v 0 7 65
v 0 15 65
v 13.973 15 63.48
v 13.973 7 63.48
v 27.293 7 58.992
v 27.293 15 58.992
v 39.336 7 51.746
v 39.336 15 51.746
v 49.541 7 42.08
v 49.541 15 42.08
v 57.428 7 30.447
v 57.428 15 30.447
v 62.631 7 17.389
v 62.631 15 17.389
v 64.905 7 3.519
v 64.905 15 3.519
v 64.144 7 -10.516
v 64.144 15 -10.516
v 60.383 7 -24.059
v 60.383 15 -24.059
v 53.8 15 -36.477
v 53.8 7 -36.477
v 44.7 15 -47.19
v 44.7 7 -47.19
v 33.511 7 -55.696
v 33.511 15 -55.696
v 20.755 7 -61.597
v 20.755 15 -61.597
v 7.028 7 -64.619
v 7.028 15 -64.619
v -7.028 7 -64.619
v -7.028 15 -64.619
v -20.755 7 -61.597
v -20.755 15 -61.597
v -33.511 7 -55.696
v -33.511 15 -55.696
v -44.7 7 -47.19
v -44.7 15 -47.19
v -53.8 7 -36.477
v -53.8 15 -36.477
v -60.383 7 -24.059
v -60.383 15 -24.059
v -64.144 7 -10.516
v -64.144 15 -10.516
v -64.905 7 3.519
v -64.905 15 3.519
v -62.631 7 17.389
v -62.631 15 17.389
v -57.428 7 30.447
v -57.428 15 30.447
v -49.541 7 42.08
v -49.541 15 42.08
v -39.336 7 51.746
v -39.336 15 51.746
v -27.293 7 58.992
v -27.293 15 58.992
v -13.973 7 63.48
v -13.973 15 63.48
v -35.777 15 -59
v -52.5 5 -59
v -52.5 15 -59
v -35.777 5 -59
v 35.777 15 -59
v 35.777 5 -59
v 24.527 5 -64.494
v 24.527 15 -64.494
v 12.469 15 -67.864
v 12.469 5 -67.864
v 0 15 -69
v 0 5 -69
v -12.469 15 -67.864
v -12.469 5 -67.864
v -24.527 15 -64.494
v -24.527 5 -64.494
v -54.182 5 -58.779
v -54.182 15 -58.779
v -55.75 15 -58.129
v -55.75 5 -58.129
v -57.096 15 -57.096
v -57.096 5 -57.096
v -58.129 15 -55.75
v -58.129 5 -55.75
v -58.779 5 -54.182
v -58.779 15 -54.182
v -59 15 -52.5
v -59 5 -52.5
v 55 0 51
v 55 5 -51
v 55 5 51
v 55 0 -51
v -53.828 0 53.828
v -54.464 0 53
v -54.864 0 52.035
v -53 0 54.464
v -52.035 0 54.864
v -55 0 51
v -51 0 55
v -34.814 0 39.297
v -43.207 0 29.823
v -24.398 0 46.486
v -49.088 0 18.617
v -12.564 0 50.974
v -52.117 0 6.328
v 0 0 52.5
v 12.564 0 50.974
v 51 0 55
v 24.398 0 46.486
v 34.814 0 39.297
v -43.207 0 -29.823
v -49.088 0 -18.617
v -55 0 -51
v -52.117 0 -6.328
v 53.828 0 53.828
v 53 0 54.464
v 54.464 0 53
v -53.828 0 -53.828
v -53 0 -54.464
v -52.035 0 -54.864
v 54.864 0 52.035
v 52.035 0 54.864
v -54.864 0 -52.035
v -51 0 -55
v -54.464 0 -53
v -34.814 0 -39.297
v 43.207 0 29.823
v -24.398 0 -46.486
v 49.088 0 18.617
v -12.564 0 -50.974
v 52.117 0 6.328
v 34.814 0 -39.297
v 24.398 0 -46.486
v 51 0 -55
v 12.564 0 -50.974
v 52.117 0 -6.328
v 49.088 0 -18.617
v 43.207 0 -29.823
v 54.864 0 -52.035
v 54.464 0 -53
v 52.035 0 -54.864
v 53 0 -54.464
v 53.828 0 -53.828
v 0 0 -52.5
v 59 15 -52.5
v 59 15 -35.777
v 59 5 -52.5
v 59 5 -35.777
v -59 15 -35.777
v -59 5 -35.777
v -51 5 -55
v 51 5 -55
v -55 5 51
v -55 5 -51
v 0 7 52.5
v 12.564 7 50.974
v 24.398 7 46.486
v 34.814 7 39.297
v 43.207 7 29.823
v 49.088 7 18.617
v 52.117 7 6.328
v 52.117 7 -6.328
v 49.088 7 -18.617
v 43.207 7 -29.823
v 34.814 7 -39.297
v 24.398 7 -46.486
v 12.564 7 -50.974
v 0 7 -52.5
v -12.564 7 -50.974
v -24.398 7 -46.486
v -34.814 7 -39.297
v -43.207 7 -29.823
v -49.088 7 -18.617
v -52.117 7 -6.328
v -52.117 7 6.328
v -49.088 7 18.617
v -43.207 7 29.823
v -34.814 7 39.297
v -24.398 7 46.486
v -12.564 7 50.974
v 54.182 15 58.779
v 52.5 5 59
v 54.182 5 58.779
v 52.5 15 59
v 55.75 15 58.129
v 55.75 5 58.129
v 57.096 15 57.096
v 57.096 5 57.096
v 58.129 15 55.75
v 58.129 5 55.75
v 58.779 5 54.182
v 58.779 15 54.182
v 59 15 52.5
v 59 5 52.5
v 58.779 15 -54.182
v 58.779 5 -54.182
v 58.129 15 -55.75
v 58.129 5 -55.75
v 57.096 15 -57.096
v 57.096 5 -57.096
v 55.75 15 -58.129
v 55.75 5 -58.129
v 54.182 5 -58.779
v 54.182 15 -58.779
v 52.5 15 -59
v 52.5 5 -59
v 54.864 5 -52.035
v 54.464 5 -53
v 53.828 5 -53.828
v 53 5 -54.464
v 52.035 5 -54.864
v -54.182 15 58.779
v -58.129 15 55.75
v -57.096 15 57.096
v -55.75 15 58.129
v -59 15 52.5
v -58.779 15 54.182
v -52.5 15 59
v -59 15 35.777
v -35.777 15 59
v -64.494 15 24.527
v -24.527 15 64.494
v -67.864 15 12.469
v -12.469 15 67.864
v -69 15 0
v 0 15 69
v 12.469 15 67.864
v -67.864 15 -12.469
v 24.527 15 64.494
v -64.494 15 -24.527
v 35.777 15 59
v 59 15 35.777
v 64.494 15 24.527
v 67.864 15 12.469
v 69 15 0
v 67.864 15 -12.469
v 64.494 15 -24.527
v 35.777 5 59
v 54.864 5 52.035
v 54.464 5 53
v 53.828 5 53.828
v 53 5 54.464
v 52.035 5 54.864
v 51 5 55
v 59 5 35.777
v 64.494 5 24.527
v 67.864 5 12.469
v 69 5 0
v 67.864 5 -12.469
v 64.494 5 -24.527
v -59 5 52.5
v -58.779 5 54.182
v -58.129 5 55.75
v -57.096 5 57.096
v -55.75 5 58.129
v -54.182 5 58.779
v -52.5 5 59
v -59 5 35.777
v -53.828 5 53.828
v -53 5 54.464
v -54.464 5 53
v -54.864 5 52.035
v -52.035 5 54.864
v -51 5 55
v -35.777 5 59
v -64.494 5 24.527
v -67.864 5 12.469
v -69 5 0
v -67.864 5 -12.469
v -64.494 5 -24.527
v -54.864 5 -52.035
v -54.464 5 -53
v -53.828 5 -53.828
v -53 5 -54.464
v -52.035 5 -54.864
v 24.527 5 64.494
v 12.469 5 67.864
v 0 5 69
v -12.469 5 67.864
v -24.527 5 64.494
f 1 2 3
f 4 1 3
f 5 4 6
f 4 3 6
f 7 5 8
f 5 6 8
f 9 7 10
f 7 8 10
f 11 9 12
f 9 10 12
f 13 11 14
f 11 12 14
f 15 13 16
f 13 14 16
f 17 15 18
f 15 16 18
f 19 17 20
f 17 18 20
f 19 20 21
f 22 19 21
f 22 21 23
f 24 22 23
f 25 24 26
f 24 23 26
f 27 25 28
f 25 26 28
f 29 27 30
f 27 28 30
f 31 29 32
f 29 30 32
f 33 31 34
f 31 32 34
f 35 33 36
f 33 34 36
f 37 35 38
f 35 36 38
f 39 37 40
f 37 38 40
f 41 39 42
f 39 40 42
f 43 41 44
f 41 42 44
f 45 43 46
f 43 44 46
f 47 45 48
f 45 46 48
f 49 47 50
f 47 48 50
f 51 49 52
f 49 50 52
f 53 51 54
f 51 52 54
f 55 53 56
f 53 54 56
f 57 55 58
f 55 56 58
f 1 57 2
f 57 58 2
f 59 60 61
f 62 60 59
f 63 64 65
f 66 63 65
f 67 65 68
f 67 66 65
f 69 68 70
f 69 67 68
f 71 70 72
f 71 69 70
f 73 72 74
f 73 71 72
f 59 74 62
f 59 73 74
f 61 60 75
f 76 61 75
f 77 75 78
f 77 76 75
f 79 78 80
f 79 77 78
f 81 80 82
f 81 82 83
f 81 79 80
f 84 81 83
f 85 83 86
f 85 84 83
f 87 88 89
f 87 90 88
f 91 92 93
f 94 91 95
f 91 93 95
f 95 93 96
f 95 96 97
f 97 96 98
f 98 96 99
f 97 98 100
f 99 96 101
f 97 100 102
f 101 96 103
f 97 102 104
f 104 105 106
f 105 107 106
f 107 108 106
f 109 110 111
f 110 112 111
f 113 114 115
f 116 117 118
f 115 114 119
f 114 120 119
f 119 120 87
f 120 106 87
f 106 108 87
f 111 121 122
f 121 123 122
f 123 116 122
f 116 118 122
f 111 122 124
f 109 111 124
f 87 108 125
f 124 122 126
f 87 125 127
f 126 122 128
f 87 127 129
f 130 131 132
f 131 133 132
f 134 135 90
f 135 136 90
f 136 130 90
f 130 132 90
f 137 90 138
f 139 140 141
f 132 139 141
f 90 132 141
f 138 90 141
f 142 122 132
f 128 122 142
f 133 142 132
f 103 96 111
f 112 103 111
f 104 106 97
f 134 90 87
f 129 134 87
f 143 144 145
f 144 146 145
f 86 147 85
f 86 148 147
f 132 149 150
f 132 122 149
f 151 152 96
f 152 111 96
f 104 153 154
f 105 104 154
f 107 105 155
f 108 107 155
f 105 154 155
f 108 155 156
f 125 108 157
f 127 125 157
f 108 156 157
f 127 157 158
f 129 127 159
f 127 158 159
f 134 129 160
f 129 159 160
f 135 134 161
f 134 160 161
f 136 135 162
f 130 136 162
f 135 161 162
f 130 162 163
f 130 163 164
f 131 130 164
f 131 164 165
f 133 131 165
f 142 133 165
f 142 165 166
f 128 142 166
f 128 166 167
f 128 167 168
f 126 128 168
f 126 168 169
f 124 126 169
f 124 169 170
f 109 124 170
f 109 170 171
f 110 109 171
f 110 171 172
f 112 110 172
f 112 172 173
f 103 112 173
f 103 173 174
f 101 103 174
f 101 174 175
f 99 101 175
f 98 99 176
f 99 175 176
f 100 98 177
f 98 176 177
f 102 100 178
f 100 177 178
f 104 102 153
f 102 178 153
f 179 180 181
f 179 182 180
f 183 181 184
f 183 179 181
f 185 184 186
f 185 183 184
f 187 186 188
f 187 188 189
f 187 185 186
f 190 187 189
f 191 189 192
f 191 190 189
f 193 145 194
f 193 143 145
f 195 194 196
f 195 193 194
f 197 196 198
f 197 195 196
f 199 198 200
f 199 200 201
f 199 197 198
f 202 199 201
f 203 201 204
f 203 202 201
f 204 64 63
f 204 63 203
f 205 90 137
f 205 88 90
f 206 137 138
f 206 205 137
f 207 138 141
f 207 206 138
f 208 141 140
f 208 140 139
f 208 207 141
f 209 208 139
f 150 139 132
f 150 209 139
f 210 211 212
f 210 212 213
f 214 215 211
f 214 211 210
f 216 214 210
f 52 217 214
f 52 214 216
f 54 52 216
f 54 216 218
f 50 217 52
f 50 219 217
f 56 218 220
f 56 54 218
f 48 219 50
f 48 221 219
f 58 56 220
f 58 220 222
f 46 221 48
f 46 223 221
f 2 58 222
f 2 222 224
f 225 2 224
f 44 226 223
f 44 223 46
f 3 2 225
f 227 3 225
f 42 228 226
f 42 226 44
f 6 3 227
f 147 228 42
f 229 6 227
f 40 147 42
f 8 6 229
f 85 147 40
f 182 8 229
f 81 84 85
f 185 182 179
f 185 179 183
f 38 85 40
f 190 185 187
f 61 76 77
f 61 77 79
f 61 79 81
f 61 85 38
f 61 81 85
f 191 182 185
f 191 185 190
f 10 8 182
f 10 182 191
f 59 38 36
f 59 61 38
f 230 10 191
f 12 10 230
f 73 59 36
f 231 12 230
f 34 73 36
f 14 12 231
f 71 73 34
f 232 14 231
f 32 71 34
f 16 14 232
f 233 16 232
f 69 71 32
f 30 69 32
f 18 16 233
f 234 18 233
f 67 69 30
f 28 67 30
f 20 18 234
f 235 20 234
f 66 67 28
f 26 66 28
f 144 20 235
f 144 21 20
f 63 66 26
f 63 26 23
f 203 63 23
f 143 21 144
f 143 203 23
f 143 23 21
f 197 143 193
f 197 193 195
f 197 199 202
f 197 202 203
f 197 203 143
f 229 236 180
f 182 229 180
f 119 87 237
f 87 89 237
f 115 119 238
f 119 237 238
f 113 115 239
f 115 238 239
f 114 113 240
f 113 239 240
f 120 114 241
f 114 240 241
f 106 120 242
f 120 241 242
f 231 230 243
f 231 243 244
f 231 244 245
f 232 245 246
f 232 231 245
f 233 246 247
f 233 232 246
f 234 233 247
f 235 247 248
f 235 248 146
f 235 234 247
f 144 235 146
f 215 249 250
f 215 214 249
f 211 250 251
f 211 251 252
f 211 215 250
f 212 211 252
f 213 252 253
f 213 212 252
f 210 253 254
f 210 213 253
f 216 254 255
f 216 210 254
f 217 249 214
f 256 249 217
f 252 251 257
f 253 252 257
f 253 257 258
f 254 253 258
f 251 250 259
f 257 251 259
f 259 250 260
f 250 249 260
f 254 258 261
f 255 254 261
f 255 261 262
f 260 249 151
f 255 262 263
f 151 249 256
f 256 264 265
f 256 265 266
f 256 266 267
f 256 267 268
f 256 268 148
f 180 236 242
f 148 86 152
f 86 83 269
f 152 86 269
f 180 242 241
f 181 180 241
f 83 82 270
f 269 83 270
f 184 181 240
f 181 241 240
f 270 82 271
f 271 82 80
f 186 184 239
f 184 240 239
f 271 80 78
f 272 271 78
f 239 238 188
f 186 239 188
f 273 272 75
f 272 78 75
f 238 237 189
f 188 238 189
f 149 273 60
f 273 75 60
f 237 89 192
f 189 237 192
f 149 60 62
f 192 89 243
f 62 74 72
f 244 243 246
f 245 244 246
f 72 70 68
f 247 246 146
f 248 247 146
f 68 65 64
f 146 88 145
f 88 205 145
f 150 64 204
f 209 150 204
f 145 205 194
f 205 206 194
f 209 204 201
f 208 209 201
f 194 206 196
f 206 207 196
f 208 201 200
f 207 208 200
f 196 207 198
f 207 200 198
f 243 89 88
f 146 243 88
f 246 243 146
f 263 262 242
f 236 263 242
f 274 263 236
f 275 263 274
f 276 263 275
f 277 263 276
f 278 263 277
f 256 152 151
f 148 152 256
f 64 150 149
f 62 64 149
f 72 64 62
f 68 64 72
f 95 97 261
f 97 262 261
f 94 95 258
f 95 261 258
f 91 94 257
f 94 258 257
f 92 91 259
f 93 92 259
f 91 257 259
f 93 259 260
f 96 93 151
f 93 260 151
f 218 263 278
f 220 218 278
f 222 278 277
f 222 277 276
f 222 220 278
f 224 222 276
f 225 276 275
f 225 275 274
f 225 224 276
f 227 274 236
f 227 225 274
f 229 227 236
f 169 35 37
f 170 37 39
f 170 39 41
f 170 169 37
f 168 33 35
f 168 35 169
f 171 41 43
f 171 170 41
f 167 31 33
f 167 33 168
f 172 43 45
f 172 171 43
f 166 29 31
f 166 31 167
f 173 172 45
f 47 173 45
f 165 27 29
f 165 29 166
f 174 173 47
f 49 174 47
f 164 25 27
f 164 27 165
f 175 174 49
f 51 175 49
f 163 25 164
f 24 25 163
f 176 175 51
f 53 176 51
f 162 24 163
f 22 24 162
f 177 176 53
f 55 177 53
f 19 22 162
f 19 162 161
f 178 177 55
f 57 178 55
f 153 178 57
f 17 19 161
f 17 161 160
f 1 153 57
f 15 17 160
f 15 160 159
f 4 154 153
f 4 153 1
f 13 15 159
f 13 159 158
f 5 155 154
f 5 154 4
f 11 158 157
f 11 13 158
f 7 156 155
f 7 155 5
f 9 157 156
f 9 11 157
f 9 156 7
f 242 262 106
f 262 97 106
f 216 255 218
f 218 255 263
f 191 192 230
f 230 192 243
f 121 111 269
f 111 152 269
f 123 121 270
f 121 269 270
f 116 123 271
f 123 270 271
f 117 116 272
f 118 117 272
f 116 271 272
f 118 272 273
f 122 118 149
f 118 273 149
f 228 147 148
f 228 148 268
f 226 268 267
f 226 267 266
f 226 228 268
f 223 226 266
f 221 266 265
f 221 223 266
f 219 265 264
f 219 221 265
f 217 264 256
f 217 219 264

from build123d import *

# Parameters (mm, degrees)
SKETCH1_W           = 118
SKETCH1_H           = 118
BOSS_EXTRUDE1_DEPTH = 15
SKETCH2_W           = 118
SKETCH2_H           = 118
SKETCH2_W_2         = 110
SKETCH2_H_2         = 110
CUT_EXTRUDE1_DEPTH  = 5
SKETCH6_R           = 69
BOSS_EXTRUDE2_DEPTH = 10
SKETCH3_R           = 52.5
CUT_EXTRUDE2_DEPTH  = 99.726896031
SKETCH4_R           = 65
CUT_EXTRUDE3_DEPTH  = 8
FILLET1_R           = 4
FILLET2_R           = 6.5


with BuildPart() as part:
    # Sketch1 → Boss-Extrude1 (new body)
    with BuildSketch(Plane(origin=(0, 0, 0), x_dir=(1, 0, 0), z_dir=(0, 1, 0))):
        Rectangle(SKETCH1_W, SKETCH1_H)
    extrude(amount=BOSS_EXTRUDE1_DEPTH)

    # Sketch2 → Cut-Extrude1 (cut)
    with BuildSketch(Plane.XZ):
        Rectangle(SKETCH2_W, SKETCH2_H)
        Rectangle(SKETCH2_W_2, SKETCH2_H_2, mode=Mode.SUBTRACT)
    extrude(amount=-CUT_EXTRUDE1_DEPTH, mode=Mode.SUBTRACT)

    # Sketch6 → Boss-Extrude2 (add)
    with BuildSketch(Plane(origin=(0, 15, 0), x_dir=(1, 0, 0), z_dir=(0, 1, 0))):
        Circle(SKETCH6_R)
    extrude(amount=-BOSS_EXTRUDE2_DEPTH)

    # Sketch3 → Cut-Extrude2 (cut, through all)
    with BuildSketch(Plane(origin=(0, 15, 0), x_dir=(1, 0, 0), z_dir=(0, 1, 0))):
        with Locations(Location((0, 0, 0), (0, 0, 270))):
            Circle(SKETCH3_R)
    extrude(amount=-CUT_EXTRUDE2_DEPTH, mode=Mode.SUBTRACT)

    # Sketch4 → Cut-Extrude3 (cut)
    with BuildSketch(Plane(origin=(0, 15, 0), x_dir=(1, 0, 0), z_dir=(0, 1, 0))):
        with Locations(Location((0, 0, 0), (0, 0, 270))):
            Circle(SKETCH4_R)
    extrude(amount=-CUT_EXTRUDE3_DEPTH, mode=Mode.SUBTRACT)

    # Fillet1
    fillet1_edges = [part.edges().sort_by_distance(p)[0] for p in [
        (55, 2.5, -55),
        (-55, 2.5, -55),
        (-55, 2.5, 55),
        (55, 2.5, 55),
    ]]
    fillet(fillet1_edges, radius=FILLET1_R)

    # Fillet2
    fillet2_edges = [part.edges().sort_by_distance(p)[0] for p in [
        (-59, 10, -59),
        (59, 10, -59),
        (59, 10, 59),
        (-59, 10, 59),
    ]]
    fillet(fillet2_edges, radius=FILLET2_R)


solid = part.part
